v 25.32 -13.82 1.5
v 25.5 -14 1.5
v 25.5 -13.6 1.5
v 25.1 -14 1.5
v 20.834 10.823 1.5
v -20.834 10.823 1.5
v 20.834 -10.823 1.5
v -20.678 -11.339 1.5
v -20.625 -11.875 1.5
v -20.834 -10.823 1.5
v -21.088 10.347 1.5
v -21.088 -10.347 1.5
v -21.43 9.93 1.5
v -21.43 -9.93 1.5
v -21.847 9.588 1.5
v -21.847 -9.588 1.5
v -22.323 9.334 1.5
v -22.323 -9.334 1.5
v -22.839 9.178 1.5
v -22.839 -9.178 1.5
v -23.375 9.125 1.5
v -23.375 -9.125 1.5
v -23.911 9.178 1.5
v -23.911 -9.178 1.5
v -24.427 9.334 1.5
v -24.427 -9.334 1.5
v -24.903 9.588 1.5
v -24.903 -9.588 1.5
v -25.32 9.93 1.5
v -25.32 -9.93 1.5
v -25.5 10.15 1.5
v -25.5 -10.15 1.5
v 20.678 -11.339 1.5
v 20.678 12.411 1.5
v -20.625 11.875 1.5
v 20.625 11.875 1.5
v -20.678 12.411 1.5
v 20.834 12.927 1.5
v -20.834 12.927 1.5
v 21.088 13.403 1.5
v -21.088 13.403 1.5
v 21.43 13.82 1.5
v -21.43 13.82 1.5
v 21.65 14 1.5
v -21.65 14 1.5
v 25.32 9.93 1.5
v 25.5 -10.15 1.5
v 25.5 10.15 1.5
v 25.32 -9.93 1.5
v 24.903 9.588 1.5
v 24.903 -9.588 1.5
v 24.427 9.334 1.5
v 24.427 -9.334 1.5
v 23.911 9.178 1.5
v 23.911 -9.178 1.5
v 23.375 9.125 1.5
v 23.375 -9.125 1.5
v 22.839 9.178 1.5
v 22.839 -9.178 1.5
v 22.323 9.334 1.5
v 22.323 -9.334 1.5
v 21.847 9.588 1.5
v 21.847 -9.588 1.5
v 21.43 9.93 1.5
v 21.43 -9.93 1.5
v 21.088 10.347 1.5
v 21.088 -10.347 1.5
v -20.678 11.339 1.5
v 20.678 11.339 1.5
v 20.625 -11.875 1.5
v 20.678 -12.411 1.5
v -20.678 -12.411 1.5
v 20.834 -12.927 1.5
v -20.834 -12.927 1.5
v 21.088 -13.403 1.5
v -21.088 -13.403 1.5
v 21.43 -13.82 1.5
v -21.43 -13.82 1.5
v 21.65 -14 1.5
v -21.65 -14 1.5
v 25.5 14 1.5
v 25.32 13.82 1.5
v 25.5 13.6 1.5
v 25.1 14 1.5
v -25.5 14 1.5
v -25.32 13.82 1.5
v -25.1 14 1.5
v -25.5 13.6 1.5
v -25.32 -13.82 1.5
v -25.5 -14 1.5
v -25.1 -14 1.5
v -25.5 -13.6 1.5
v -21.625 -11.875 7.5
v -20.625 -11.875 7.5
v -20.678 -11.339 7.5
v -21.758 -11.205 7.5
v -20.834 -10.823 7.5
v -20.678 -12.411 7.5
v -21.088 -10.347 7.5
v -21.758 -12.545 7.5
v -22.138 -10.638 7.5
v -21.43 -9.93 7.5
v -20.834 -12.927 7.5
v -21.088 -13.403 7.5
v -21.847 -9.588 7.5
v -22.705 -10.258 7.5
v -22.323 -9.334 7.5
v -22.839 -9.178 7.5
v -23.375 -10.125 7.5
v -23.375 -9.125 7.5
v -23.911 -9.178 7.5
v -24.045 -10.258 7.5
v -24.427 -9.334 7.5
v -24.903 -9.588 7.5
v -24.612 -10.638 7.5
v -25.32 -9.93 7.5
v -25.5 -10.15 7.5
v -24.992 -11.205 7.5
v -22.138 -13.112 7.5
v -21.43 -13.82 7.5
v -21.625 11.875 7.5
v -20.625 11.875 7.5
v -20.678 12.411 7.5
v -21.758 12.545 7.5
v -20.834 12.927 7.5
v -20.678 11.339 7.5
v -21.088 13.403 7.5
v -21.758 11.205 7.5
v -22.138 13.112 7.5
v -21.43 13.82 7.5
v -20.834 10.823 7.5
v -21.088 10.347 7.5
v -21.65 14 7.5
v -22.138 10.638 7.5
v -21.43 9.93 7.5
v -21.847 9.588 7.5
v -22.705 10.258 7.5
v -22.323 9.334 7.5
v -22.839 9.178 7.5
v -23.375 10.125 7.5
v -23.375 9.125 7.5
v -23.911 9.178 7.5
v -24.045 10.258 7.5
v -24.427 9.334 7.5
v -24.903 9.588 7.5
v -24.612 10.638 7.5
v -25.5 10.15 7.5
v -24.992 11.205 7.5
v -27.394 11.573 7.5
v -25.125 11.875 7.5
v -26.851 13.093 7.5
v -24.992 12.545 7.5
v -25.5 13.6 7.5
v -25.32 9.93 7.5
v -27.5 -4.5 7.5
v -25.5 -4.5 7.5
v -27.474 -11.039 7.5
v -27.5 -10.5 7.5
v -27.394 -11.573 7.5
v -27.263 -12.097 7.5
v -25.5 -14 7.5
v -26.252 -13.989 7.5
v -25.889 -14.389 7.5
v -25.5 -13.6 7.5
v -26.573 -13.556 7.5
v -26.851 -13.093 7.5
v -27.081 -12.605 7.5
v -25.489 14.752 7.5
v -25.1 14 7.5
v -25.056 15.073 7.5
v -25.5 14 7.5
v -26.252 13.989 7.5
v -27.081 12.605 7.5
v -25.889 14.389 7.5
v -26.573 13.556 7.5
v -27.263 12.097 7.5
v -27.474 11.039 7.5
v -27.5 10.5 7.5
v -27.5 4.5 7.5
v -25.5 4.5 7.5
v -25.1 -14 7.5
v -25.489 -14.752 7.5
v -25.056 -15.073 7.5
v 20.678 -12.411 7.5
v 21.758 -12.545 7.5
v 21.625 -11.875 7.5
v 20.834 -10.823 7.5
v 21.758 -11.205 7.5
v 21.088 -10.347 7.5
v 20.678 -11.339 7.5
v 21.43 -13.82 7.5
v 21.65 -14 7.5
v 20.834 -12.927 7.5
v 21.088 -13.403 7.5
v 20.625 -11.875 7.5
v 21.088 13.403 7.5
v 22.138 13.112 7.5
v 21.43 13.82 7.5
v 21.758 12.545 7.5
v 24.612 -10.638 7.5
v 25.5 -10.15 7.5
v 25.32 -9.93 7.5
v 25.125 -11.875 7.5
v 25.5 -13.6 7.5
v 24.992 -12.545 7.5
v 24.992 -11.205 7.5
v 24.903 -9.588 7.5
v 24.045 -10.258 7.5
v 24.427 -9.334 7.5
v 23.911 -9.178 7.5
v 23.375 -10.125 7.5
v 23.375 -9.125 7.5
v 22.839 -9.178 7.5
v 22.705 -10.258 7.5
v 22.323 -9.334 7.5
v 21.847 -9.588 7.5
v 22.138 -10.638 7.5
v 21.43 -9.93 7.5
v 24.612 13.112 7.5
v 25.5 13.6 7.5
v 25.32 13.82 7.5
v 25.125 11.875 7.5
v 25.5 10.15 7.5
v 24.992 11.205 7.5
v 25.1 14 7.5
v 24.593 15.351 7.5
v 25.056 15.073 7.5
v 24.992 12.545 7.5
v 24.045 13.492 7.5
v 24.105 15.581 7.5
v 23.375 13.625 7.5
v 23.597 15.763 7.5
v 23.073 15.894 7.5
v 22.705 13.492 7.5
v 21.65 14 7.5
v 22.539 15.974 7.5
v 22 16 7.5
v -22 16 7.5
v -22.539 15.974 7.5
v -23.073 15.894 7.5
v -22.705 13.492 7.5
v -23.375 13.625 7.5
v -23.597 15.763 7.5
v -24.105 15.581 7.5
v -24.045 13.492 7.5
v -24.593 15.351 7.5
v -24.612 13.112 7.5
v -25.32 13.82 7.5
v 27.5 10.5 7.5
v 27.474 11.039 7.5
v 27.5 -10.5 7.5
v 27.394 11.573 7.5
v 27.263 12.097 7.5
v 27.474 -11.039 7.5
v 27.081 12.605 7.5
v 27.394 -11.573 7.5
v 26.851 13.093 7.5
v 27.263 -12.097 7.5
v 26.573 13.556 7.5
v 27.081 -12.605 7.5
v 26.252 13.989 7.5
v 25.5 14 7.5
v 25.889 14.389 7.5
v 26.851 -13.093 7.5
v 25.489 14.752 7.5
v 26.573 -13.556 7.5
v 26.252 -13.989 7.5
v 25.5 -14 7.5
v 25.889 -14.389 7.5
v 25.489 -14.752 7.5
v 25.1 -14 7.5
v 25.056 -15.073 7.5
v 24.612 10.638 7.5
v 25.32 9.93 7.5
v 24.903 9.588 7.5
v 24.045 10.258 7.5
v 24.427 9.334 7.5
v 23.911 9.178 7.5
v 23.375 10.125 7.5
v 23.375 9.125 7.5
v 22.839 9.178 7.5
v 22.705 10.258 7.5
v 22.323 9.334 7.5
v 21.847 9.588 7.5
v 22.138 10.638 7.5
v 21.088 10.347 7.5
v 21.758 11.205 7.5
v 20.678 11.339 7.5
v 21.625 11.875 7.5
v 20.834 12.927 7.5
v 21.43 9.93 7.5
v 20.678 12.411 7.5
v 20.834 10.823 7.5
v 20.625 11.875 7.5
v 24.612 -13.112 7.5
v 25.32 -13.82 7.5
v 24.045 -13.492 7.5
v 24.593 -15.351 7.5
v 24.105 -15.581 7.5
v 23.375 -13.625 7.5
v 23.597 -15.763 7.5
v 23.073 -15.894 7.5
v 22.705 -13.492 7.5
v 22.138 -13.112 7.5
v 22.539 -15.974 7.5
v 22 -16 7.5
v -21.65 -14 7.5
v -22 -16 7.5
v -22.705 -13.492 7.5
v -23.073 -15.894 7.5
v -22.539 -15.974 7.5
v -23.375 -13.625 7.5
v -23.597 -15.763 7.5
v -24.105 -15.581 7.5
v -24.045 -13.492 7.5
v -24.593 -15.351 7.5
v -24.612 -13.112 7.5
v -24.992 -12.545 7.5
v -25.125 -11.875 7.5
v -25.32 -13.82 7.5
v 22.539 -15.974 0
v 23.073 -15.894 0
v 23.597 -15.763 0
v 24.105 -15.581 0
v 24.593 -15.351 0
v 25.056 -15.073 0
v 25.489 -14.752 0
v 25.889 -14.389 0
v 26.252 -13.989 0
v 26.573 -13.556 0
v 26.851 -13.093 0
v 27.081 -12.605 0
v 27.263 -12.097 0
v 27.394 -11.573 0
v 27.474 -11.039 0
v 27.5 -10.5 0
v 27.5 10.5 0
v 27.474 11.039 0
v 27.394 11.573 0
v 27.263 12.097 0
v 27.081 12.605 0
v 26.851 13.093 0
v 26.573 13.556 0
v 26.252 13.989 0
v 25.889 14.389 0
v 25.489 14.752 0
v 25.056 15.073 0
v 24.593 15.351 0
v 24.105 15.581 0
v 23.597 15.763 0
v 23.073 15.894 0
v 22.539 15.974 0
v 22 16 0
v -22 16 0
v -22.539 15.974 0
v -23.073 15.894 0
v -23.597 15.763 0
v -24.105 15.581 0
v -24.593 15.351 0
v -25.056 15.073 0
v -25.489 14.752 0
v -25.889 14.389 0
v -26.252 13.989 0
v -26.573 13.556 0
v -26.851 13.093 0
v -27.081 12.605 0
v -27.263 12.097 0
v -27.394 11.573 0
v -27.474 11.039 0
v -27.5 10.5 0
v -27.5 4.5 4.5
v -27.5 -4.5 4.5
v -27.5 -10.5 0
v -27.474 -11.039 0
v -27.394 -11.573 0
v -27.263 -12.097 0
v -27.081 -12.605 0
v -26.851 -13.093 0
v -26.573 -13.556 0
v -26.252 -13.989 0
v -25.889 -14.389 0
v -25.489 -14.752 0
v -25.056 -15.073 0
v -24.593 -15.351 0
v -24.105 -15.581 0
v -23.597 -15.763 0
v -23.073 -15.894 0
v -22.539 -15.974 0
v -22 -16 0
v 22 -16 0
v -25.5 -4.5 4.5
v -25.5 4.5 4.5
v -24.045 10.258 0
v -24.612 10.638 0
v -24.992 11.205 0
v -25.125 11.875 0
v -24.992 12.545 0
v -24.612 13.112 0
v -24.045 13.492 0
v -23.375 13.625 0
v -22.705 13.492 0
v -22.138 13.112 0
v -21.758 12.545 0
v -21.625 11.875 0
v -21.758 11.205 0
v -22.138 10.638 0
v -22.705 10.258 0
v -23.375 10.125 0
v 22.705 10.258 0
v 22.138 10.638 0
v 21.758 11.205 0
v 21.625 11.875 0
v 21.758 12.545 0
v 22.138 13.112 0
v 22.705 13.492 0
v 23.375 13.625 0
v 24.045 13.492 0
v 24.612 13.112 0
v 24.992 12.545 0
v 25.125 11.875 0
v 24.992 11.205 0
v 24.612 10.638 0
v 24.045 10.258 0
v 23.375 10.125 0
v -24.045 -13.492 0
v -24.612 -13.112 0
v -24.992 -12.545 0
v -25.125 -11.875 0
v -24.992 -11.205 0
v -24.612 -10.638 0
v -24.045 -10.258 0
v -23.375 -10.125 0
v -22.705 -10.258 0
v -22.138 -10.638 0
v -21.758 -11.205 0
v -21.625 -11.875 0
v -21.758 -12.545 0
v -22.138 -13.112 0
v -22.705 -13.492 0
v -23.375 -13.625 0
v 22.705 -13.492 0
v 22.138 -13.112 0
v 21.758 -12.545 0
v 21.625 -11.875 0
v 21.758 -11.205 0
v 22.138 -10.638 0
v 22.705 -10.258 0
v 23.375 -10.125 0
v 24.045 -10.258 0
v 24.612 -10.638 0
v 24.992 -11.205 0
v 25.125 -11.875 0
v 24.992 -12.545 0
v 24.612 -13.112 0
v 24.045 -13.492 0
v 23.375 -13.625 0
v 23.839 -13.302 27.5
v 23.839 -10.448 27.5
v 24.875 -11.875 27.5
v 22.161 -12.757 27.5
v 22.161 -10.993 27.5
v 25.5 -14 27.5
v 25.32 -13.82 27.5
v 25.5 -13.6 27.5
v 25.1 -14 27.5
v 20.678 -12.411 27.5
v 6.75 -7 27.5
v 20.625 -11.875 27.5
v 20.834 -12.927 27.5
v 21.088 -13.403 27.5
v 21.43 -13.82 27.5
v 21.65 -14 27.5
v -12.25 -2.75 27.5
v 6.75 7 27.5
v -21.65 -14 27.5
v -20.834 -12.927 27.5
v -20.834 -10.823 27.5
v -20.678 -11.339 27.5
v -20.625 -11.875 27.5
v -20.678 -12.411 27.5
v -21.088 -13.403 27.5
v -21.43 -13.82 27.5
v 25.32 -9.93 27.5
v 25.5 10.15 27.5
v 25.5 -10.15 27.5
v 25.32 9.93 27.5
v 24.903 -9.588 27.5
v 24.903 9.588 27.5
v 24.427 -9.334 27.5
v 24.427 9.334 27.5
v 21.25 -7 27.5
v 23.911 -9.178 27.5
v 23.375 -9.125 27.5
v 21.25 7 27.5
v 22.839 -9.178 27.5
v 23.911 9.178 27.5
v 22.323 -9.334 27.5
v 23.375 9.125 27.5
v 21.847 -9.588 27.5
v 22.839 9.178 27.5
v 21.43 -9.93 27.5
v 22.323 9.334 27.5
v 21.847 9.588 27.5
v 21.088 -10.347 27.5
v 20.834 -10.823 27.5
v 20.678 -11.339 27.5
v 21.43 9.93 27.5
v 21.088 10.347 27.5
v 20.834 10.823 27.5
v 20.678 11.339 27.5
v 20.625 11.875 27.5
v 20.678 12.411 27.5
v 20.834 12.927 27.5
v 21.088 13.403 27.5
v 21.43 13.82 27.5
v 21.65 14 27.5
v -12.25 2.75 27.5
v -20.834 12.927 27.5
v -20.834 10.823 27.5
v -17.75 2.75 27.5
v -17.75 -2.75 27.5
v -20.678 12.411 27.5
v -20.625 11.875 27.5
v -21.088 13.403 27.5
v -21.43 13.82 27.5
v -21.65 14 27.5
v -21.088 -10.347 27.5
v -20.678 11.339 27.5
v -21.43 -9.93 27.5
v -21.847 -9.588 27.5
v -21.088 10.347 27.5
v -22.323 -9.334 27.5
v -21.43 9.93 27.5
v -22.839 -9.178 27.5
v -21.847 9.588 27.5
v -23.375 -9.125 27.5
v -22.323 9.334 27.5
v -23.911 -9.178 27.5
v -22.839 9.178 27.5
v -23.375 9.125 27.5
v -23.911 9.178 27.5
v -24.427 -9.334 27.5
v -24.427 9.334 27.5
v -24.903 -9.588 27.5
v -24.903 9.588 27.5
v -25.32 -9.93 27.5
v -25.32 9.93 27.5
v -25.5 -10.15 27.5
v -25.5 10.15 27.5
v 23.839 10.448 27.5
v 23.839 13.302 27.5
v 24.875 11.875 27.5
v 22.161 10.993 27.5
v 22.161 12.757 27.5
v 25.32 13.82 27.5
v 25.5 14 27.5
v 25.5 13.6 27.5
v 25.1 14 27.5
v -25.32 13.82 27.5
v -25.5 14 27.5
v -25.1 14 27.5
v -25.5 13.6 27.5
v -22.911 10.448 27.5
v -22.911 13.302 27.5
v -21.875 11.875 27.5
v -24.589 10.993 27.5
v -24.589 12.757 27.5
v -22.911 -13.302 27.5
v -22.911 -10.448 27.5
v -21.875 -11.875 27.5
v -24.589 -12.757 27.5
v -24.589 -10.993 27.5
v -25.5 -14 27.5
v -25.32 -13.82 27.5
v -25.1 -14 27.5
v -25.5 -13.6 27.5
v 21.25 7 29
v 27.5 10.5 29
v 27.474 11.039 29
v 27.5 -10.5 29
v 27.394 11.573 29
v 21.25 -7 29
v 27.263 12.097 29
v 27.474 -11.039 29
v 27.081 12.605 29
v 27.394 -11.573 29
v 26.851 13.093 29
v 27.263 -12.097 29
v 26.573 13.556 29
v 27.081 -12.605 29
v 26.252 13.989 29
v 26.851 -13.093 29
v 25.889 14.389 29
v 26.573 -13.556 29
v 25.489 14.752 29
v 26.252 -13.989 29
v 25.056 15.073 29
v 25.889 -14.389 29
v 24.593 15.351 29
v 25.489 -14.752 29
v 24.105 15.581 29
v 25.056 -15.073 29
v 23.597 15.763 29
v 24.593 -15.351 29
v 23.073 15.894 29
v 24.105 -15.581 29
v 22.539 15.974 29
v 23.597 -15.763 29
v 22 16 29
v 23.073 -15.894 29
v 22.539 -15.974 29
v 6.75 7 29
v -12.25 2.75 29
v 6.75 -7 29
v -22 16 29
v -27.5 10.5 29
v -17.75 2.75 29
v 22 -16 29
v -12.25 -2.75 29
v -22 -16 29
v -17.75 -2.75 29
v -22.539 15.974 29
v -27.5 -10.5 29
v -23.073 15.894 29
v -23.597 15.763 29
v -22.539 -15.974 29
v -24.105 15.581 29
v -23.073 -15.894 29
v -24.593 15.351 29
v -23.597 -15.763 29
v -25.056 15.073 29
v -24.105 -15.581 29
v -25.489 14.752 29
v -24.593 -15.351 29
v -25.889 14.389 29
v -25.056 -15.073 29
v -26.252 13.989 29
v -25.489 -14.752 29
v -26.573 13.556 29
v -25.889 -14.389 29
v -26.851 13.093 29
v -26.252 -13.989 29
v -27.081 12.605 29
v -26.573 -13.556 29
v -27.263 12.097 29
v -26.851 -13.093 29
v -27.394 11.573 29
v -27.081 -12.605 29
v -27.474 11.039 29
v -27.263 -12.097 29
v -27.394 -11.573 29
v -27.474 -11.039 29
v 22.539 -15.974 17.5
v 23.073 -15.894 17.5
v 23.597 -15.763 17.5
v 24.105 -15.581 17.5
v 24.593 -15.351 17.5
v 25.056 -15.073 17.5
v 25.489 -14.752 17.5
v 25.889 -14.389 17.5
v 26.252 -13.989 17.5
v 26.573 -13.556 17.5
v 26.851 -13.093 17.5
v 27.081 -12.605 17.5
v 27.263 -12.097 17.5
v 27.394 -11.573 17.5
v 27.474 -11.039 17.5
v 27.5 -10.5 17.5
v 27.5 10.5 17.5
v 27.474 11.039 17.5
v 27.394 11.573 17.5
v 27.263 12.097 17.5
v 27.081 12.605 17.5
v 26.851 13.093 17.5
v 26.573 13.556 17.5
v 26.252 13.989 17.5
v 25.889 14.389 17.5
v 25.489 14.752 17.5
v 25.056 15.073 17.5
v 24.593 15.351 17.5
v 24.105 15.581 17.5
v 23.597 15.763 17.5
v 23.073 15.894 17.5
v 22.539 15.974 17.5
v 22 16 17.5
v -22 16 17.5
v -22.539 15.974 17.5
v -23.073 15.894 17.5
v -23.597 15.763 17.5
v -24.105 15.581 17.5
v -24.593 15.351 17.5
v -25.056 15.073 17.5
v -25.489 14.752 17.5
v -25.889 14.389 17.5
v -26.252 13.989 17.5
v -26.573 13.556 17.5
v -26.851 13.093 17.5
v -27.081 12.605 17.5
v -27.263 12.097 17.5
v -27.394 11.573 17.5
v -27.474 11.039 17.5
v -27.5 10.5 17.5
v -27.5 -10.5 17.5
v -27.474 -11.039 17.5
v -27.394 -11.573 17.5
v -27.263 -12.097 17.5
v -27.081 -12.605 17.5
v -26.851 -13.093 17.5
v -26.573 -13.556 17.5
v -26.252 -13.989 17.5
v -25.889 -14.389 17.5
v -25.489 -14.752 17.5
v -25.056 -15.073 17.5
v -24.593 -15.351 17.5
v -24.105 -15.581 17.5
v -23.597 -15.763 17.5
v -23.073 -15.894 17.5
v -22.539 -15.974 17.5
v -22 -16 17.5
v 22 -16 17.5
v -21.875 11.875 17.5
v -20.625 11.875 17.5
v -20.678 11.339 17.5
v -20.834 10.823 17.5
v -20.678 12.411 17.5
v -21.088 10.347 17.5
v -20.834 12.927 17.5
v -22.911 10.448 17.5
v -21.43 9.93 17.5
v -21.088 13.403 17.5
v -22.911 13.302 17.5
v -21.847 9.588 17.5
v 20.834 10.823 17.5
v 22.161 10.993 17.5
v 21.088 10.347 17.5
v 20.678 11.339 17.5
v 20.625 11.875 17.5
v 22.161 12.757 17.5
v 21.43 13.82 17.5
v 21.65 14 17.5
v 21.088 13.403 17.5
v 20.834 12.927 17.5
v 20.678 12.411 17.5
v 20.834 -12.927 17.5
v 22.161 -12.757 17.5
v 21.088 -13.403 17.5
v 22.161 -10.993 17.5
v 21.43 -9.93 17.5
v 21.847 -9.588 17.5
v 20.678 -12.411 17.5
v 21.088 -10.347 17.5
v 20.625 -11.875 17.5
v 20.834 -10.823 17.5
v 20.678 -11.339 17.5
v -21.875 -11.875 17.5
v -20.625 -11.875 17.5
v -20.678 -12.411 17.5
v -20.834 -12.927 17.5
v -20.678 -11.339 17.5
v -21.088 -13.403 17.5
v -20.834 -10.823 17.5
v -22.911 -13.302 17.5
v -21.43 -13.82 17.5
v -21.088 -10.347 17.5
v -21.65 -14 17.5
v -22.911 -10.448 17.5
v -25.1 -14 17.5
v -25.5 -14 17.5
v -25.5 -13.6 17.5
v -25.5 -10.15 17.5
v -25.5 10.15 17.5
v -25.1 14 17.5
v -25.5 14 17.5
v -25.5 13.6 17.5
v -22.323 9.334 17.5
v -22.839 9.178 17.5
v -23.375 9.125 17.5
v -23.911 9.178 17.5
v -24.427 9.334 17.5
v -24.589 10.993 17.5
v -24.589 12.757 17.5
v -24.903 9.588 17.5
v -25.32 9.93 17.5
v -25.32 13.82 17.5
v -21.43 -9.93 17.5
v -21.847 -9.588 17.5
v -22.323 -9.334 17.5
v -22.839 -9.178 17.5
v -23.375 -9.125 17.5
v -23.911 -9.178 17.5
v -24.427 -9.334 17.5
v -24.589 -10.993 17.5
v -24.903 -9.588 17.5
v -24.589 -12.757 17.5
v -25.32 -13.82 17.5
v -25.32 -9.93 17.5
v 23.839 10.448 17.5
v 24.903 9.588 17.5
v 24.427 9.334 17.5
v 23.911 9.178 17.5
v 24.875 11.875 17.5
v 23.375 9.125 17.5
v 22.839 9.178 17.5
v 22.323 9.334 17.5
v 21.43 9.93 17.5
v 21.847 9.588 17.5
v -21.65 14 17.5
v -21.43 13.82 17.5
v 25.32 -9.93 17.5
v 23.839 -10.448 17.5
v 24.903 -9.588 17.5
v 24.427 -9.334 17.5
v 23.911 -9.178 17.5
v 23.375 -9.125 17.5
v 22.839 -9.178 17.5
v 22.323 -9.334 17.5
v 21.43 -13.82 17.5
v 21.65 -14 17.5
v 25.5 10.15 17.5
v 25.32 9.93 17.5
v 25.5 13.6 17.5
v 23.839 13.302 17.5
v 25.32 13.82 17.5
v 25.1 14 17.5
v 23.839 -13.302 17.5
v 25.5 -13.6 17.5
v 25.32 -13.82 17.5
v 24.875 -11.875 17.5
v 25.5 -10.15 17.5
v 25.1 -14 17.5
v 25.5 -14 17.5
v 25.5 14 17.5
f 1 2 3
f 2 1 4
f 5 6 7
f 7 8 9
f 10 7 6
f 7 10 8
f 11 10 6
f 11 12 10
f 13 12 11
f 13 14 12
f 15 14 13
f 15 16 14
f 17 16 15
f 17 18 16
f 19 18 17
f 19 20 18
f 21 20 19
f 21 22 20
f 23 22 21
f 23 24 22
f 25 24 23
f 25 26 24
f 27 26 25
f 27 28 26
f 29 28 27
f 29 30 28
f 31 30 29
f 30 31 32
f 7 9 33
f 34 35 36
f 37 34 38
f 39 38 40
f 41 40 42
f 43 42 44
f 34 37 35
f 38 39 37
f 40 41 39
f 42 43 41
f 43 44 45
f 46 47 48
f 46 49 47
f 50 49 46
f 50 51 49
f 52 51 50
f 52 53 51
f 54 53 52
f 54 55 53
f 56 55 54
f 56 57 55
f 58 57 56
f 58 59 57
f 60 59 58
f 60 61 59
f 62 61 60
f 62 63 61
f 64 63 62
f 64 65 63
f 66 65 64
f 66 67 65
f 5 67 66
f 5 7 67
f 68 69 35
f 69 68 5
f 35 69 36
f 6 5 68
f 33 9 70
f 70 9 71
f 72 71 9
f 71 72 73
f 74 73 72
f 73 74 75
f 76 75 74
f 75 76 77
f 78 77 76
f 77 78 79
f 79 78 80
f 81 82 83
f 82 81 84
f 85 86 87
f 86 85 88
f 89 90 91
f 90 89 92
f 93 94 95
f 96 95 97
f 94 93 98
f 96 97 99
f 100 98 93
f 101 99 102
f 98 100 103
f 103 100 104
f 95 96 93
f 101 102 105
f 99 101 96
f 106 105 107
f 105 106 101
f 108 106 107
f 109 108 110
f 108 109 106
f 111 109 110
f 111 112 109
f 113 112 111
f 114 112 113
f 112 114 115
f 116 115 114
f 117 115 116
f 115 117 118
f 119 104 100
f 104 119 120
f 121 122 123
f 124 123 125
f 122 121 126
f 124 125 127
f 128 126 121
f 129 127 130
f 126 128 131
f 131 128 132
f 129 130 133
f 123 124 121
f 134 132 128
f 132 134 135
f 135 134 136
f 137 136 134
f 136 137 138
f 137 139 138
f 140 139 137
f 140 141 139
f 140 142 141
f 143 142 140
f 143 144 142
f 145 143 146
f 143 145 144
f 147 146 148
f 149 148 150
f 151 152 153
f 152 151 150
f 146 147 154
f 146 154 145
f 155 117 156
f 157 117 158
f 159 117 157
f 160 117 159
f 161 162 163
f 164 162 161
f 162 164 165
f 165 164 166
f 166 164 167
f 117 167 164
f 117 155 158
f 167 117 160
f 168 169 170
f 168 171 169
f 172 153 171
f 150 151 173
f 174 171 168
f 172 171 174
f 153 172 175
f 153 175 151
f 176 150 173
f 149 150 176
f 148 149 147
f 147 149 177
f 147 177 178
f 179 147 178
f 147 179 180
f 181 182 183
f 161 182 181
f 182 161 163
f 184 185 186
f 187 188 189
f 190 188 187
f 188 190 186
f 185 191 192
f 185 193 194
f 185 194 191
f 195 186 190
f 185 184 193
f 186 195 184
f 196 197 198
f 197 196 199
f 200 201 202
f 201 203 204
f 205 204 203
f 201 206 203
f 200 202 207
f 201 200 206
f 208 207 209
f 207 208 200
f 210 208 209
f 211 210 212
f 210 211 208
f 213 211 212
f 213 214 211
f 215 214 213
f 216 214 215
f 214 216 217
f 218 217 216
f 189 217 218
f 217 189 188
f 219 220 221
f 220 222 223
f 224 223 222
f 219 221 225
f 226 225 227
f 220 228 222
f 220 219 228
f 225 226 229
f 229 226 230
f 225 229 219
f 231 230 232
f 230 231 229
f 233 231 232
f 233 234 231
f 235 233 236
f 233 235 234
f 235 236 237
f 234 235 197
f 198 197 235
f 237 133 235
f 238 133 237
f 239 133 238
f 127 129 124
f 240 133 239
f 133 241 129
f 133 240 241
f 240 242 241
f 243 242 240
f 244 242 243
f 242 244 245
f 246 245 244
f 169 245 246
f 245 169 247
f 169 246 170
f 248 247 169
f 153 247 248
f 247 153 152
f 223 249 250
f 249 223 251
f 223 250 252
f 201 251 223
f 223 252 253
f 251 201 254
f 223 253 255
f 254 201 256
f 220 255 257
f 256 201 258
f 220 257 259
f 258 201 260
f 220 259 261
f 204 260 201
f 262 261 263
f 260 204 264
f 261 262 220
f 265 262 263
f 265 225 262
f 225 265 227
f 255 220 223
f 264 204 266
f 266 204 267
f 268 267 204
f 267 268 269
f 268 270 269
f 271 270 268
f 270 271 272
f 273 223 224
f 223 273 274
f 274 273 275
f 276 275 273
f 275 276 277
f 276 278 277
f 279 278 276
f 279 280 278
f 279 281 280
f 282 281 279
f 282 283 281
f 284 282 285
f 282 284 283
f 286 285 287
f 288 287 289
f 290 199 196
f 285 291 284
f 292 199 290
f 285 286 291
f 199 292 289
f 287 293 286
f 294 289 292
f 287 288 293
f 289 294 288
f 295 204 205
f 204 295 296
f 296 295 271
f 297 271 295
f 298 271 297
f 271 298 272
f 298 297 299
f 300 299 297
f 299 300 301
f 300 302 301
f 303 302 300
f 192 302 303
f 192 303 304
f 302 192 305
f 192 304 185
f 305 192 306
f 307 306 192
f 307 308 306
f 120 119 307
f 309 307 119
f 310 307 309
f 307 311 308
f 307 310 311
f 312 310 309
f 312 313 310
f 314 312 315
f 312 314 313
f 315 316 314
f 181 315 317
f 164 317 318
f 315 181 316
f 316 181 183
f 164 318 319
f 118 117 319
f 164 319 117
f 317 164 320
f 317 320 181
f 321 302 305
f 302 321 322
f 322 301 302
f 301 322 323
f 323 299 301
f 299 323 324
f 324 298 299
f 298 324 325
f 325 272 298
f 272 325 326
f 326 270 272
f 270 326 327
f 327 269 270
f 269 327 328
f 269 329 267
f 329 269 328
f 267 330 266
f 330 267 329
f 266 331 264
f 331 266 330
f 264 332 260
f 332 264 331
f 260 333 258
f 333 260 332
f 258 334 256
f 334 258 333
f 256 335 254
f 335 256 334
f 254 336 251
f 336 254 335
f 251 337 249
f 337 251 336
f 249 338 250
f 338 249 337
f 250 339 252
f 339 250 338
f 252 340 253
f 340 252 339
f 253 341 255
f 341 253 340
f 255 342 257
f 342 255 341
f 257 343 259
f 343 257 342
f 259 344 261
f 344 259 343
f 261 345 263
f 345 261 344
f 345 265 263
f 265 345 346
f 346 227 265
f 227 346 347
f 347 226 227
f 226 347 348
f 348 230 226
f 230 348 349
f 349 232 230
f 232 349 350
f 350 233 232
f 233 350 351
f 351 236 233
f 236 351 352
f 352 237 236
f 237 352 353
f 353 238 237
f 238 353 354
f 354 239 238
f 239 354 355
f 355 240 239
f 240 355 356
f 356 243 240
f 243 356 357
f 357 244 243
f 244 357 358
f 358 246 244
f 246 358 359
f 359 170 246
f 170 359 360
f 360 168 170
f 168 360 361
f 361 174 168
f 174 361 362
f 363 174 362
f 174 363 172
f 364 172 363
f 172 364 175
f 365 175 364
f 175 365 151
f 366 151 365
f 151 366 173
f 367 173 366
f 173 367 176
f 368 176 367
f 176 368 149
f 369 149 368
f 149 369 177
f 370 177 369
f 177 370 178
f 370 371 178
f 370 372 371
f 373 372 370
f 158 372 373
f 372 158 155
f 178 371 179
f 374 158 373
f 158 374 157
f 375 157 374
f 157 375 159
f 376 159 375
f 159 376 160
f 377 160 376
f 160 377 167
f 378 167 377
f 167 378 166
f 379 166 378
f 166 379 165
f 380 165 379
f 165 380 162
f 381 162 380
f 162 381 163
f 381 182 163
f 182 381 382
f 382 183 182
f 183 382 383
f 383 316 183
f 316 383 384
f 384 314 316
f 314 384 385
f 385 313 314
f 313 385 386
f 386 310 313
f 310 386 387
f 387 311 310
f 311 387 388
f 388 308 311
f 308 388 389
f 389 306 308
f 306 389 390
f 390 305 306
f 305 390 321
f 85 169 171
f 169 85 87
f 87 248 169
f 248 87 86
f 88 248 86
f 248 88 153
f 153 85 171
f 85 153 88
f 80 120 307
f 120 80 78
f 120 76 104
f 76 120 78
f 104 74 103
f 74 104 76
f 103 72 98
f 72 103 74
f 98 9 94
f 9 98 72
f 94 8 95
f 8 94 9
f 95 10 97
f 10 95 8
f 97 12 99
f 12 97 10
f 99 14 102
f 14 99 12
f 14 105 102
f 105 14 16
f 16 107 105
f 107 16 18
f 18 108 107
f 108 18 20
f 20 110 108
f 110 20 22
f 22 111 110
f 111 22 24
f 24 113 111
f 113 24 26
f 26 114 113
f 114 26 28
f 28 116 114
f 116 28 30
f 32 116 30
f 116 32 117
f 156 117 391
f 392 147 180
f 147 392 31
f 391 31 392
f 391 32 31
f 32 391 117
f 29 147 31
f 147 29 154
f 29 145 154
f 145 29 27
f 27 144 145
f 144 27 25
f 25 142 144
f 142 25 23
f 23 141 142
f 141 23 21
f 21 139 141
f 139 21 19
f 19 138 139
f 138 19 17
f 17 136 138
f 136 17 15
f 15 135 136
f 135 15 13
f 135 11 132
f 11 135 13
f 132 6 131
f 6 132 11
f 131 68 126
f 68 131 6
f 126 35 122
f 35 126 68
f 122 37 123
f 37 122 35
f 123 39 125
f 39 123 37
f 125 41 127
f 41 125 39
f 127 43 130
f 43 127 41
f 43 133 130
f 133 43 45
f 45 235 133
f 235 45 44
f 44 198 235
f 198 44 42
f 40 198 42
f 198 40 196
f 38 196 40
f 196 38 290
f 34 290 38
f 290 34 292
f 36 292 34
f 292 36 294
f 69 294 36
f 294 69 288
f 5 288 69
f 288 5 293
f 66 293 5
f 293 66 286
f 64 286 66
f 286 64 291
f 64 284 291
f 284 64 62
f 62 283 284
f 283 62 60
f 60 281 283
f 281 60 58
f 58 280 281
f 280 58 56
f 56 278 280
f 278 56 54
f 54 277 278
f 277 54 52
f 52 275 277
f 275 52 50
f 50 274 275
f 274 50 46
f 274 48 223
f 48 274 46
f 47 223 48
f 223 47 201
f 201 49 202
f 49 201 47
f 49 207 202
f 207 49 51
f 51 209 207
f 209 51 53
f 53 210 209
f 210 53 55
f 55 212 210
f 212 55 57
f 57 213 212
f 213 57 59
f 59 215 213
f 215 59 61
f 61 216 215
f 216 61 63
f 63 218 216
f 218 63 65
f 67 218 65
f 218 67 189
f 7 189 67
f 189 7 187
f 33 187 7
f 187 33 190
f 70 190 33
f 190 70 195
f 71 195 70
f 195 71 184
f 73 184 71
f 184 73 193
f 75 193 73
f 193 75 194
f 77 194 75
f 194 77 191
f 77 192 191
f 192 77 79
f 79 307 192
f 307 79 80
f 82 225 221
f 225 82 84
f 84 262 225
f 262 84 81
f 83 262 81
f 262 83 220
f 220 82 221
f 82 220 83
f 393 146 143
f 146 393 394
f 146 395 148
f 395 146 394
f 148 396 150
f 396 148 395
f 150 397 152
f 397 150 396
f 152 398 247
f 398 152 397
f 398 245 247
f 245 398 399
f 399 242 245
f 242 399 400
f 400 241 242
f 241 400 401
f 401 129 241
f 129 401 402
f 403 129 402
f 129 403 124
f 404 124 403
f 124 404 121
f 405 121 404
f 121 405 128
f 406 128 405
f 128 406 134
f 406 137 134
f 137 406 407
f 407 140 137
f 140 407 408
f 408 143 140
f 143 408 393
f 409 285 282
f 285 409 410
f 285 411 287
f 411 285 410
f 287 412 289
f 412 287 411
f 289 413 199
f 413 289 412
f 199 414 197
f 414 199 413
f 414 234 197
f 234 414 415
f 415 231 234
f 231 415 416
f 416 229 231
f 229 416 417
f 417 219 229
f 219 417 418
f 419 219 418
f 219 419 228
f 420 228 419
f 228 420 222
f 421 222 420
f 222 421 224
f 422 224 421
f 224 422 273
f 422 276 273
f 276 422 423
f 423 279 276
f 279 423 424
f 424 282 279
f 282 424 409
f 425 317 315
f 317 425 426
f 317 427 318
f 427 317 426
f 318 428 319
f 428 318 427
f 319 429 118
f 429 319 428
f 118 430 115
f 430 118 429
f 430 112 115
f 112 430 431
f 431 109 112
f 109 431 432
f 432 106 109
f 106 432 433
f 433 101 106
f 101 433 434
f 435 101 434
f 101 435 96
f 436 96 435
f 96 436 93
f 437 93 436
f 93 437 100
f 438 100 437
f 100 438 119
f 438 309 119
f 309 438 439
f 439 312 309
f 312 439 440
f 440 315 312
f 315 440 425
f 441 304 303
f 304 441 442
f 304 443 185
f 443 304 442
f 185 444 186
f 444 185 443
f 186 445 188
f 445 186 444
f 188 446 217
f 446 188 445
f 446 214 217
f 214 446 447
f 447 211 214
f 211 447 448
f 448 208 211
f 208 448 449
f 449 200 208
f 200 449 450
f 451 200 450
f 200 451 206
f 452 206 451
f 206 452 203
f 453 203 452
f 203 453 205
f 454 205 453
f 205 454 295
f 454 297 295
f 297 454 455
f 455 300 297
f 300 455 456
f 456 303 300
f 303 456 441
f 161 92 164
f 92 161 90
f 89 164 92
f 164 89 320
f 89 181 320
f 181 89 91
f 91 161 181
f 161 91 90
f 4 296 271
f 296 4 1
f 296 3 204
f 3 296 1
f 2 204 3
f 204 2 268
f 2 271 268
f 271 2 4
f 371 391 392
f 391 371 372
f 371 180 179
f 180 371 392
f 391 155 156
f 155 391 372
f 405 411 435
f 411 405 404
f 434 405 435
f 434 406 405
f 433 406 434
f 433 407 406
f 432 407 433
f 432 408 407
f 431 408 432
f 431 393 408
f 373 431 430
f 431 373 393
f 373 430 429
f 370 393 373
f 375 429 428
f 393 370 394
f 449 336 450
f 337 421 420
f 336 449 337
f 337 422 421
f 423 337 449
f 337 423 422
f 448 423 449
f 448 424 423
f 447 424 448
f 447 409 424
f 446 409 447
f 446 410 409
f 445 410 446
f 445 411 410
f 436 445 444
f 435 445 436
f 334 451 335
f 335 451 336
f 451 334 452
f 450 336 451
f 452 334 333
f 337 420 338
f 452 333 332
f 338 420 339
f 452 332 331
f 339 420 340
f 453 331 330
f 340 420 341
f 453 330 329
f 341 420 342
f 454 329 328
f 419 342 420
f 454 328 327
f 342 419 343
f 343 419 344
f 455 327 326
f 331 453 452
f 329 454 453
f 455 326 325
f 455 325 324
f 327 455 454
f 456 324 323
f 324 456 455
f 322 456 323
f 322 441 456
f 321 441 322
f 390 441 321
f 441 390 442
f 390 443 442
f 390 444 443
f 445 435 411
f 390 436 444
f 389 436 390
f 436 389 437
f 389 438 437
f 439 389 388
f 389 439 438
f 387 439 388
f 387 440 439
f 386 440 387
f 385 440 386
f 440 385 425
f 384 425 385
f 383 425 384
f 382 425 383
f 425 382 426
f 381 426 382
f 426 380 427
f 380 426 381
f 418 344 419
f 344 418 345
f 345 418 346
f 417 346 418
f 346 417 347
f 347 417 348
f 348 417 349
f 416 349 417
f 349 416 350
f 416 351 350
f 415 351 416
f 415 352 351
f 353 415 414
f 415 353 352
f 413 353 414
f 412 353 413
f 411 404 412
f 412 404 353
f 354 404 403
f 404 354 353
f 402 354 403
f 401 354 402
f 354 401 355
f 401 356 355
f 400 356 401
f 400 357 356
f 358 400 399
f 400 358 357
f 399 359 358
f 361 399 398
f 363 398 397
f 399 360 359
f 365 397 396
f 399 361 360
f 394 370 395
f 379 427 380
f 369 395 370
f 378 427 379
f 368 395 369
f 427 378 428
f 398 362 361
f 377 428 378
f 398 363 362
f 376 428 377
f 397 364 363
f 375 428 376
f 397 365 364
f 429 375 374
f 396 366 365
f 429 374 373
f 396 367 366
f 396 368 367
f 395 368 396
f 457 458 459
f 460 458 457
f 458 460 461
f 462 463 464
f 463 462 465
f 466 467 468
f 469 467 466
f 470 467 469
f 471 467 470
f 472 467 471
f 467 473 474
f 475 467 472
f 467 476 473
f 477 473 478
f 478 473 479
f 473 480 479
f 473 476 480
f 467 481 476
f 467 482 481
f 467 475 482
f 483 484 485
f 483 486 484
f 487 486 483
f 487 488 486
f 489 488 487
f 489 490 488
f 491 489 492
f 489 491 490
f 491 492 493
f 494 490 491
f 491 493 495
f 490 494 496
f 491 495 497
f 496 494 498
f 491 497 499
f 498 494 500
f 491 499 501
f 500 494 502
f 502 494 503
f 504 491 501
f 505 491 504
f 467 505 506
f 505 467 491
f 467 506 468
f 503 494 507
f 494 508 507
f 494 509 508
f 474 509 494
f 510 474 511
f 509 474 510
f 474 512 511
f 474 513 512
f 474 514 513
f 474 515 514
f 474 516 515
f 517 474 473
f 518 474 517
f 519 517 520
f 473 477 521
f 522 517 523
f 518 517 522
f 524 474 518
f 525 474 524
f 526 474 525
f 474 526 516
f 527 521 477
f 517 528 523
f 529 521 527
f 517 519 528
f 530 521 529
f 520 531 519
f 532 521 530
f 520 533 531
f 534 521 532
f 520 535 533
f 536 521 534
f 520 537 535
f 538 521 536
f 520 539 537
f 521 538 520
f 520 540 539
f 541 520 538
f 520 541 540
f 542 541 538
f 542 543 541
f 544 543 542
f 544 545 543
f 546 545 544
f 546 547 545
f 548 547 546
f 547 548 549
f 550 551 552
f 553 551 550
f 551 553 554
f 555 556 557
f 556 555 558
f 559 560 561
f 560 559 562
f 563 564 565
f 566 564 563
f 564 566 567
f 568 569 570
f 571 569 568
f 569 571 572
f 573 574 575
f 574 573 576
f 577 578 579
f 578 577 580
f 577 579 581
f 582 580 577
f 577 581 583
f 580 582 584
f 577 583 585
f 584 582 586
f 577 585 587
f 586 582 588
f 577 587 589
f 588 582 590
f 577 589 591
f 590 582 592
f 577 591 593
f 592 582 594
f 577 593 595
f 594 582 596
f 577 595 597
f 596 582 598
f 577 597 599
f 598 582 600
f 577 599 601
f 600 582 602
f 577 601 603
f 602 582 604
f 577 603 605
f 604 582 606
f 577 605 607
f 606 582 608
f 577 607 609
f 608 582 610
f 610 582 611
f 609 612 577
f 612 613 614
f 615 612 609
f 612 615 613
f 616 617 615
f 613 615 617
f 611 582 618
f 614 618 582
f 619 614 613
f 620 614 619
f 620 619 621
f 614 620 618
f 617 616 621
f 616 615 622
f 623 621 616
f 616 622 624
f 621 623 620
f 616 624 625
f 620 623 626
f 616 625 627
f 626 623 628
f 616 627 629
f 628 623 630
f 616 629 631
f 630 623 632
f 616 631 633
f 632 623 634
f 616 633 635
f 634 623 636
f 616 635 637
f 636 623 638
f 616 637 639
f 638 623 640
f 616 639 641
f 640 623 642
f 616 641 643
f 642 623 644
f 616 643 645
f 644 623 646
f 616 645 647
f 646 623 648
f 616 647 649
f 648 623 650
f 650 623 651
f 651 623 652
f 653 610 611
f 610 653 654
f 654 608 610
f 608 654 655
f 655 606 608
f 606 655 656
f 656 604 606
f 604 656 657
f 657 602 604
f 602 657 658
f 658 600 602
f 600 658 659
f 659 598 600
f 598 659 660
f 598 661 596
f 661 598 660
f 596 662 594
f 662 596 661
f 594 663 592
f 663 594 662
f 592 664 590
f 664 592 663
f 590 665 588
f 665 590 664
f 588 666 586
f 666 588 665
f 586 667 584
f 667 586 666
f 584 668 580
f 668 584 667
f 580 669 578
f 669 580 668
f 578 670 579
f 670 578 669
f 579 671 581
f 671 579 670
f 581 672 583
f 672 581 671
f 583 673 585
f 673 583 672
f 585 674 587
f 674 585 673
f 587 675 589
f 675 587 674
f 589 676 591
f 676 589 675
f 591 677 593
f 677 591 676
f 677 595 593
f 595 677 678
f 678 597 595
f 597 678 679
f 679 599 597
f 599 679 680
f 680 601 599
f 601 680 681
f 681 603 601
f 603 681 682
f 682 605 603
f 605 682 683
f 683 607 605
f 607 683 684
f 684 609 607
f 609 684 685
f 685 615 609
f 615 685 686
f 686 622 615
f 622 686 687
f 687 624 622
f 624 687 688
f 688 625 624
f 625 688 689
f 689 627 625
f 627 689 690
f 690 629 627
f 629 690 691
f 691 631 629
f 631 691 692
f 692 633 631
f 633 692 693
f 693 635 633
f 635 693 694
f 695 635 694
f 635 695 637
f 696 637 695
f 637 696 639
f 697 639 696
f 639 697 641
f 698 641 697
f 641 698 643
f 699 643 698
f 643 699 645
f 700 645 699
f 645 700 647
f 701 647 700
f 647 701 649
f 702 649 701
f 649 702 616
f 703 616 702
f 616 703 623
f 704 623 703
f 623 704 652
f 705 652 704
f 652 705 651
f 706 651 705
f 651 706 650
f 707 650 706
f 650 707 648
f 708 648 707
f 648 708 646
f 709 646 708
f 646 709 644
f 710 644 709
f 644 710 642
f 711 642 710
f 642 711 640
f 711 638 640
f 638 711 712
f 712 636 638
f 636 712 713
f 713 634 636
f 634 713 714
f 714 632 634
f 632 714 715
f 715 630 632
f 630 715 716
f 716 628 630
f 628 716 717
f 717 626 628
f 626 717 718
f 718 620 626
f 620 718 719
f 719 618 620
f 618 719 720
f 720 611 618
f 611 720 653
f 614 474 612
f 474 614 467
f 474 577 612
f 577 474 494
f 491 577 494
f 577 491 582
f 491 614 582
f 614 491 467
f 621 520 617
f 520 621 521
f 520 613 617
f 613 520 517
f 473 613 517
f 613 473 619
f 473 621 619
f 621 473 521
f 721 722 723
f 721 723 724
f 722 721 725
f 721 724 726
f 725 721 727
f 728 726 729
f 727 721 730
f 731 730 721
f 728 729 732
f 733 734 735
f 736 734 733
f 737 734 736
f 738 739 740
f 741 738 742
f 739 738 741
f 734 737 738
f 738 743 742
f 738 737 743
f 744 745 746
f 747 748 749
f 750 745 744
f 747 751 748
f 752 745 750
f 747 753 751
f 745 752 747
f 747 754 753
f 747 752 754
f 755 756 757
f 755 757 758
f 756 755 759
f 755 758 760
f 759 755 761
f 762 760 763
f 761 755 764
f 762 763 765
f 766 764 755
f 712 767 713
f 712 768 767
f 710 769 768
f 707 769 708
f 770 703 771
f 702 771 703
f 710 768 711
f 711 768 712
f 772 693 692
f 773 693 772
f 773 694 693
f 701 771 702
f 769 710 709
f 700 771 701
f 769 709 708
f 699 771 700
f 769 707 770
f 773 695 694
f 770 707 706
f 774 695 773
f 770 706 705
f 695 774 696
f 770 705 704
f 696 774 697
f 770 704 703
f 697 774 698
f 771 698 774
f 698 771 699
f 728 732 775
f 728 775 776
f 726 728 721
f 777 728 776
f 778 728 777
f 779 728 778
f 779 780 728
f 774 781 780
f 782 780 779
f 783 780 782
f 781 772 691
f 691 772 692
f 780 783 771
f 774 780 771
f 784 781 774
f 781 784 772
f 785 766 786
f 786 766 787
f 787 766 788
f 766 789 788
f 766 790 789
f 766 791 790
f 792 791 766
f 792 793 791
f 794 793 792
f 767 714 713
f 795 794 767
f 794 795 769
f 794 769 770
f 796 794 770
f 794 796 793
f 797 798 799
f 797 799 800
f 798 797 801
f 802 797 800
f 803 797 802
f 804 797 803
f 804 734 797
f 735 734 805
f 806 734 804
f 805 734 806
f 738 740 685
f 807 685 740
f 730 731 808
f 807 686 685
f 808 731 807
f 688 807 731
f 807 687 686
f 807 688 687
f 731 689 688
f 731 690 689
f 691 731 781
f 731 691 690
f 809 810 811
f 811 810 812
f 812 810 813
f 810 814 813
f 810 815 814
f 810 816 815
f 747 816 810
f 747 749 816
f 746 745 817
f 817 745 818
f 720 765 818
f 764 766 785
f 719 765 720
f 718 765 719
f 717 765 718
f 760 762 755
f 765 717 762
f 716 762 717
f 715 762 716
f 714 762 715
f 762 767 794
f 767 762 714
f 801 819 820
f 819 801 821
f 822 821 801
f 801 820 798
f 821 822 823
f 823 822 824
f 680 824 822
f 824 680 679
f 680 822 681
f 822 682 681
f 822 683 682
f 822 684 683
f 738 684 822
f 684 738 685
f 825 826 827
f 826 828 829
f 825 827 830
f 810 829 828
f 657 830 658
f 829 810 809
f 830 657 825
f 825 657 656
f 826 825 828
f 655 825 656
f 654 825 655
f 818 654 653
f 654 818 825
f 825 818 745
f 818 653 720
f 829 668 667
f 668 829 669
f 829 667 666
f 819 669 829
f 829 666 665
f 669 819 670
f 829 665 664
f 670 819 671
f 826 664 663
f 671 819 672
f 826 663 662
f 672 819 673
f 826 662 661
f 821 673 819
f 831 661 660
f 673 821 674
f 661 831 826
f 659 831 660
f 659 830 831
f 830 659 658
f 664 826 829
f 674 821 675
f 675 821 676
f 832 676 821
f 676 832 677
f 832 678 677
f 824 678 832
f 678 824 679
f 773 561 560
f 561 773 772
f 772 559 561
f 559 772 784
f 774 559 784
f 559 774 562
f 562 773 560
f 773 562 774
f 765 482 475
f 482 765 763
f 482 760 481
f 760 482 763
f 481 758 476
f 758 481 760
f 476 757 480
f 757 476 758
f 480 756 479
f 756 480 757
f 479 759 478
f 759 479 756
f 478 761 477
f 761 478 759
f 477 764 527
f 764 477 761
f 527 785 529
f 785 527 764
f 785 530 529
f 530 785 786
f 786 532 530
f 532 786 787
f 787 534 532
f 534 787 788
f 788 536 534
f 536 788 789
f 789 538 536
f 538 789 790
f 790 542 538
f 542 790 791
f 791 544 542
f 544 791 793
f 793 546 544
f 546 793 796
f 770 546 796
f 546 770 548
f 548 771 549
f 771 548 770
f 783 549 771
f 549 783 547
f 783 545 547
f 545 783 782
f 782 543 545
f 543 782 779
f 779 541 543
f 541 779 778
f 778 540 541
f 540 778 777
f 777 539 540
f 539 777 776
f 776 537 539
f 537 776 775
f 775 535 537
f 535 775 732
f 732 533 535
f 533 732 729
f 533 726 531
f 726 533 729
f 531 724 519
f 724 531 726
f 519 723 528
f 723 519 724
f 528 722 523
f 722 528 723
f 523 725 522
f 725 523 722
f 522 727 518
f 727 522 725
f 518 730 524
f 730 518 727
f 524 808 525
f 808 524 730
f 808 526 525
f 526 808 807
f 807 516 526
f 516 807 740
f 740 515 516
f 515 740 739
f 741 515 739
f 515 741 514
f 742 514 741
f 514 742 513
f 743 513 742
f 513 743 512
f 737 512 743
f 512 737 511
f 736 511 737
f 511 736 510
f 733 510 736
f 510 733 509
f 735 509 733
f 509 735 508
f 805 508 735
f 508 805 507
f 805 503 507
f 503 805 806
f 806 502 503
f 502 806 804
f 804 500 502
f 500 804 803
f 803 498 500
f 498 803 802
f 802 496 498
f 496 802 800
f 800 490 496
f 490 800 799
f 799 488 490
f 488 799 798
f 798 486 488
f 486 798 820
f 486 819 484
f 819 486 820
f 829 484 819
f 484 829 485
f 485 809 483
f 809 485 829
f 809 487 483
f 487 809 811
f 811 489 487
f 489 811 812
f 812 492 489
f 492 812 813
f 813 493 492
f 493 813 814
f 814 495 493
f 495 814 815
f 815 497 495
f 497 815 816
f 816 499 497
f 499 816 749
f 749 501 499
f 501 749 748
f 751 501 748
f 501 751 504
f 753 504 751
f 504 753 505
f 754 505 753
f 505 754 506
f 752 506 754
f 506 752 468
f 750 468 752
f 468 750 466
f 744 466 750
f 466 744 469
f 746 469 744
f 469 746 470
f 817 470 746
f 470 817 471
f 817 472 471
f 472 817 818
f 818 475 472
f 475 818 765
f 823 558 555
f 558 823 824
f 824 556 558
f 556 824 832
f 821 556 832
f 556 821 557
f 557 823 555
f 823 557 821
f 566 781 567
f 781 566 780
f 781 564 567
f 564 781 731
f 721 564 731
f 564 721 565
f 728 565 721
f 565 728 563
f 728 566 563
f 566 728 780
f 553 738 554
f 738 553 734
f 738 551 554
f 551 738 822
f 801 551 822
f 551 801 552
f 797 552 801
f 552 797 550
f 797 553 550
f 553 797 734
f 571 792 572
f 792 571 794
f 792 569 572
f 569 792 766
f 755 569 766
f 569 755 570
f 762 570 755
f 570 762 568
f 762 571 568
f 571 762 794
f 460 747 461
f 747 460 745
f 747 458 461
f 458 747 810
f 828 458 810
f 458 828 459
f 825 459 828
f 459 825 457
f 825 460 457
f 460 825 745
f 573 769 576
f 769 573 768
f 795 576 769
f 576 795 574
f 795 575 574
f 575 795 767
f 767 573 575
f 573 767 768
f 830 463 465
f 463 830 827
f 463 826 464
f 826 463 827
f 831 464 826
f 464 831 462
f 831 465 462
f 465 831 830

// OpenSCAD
// file: common.scad
module PlaceAtCentres(centres)
{
  dx = centres[0] / 2;
  dy = centres[1] / 2;

  for(x = [-dx, dx])
  {
    for(y = [-dy, dy])
    {
      translate([x, y])
      {
        children();
      }
    }
  }
}

module OuterProjection(size, radius)
{
  centres = size - (2 * [radius, radius]);

  hull()
  {
    PlaceAtCentres(centres)
    {
      circle(r=radius, $fn=64);
    }
  }
}

module MountHoles(centres, support_diameter, hole_diameter, hole_edges)
{
  difference()
  {
    PlaceAtCentres(centres)
    {
      circle(d=support_diameter, $fn=32);
    }

    PlaceAtCentres(centres)
    {
      circle(d=hole_diameter, $fn=hole_edges);
    }
  }
}

module InnerProjection(size, wall_thickness, radius, hole_centres, support_diameter, hole_diameter, hole_edges)
{
  difference()
  {
    OuterProjection(size, radius);
    square(size - (2 * [wall_thickness, wall_thickness]), center=true);
  }
  MountHoles(hole_centres, support_diameter, hole_diameter, hole_edges);
}

module LowerPlate(size, radius, hole_centres, hole_diameter, hole_edges)
{
  difference()
  {
    OuterProjection(size, radius);

    PlaceAtCentres(hole_centres)
    {
      circle(d=hole_diameter, $fn=hole_edges);
    }
  }
}
// file: dimensions.scad
outer_dimensions = [55, 32];
outer_radius = 5.5;
wall = 2;

mounting_hole_centres = outer_dimensions - (1.5 * [outer_radius, outer_radius]);
hole_support = 5.5;

upper_plate = 1.5;
upper_height = 10;

lower_plate = 1.5;
lower_height = 6;
// file: parts/upper.scad
use <../common.scad>
include <../dimensions.scad>

module Upper()
{
  translate([0, 0, upper_height])
  {
    color("red")
    {
      linear_extrude(upper_plate)
      {
        difference()
        {
          OuterProjection(outer_dimensions, outer_radius);

          /* NeoPixel cutout */
          translate([-15, 0])
          {
            square([5.5, 5.5], center=true);
          }

          /* Cherry switch cutout */
          translate([14, 0])
          {
            square([14.5, 14], center=true);
          }
        }
      }
    }
  }

  color("green")
  {
    linear_extrude(upper_height)
    {
      InnerProjection(outer_dimensions, wall, outer_radius, mounting_hole_centres, hole_support, 3, 5);
    }
  }
}

Upper();
// file: parts/lower.scad
use <../common.scad>
include <../dimensions.scad>

module Lower()
{
  translate([0, 0, lower_plate])
  {
    difference()
    {
      color("blue")
      {
        linear_extrude(lower_height)
        {
          InnerProjection(outer_dimensions, wall, outer_radius, mounting_hole_centres, hole_support, 3.5, 16);
        }
      }

      translate([-(outer_dimensions[0] / 2) - 1, -9 / 2, 3])
      {
        cube([wall + 2, 9, 4]);
      }
    }
  }

  color("magenta")
  {
    linear_extrude(lower_plate)
    {
      LowerPlate(outer_dimensions, outer_radius, mounting_hole_centres, 3.5, 16);
    }
  }
}

Lower();
// main file
use <parts/lower.scad>
use <parts/upper.scad>
include <dimensions.scad>

explode = 10;

Lower();

translate([0, 0, lower_plate + lower_height + explode])
{
  Upper();
}
